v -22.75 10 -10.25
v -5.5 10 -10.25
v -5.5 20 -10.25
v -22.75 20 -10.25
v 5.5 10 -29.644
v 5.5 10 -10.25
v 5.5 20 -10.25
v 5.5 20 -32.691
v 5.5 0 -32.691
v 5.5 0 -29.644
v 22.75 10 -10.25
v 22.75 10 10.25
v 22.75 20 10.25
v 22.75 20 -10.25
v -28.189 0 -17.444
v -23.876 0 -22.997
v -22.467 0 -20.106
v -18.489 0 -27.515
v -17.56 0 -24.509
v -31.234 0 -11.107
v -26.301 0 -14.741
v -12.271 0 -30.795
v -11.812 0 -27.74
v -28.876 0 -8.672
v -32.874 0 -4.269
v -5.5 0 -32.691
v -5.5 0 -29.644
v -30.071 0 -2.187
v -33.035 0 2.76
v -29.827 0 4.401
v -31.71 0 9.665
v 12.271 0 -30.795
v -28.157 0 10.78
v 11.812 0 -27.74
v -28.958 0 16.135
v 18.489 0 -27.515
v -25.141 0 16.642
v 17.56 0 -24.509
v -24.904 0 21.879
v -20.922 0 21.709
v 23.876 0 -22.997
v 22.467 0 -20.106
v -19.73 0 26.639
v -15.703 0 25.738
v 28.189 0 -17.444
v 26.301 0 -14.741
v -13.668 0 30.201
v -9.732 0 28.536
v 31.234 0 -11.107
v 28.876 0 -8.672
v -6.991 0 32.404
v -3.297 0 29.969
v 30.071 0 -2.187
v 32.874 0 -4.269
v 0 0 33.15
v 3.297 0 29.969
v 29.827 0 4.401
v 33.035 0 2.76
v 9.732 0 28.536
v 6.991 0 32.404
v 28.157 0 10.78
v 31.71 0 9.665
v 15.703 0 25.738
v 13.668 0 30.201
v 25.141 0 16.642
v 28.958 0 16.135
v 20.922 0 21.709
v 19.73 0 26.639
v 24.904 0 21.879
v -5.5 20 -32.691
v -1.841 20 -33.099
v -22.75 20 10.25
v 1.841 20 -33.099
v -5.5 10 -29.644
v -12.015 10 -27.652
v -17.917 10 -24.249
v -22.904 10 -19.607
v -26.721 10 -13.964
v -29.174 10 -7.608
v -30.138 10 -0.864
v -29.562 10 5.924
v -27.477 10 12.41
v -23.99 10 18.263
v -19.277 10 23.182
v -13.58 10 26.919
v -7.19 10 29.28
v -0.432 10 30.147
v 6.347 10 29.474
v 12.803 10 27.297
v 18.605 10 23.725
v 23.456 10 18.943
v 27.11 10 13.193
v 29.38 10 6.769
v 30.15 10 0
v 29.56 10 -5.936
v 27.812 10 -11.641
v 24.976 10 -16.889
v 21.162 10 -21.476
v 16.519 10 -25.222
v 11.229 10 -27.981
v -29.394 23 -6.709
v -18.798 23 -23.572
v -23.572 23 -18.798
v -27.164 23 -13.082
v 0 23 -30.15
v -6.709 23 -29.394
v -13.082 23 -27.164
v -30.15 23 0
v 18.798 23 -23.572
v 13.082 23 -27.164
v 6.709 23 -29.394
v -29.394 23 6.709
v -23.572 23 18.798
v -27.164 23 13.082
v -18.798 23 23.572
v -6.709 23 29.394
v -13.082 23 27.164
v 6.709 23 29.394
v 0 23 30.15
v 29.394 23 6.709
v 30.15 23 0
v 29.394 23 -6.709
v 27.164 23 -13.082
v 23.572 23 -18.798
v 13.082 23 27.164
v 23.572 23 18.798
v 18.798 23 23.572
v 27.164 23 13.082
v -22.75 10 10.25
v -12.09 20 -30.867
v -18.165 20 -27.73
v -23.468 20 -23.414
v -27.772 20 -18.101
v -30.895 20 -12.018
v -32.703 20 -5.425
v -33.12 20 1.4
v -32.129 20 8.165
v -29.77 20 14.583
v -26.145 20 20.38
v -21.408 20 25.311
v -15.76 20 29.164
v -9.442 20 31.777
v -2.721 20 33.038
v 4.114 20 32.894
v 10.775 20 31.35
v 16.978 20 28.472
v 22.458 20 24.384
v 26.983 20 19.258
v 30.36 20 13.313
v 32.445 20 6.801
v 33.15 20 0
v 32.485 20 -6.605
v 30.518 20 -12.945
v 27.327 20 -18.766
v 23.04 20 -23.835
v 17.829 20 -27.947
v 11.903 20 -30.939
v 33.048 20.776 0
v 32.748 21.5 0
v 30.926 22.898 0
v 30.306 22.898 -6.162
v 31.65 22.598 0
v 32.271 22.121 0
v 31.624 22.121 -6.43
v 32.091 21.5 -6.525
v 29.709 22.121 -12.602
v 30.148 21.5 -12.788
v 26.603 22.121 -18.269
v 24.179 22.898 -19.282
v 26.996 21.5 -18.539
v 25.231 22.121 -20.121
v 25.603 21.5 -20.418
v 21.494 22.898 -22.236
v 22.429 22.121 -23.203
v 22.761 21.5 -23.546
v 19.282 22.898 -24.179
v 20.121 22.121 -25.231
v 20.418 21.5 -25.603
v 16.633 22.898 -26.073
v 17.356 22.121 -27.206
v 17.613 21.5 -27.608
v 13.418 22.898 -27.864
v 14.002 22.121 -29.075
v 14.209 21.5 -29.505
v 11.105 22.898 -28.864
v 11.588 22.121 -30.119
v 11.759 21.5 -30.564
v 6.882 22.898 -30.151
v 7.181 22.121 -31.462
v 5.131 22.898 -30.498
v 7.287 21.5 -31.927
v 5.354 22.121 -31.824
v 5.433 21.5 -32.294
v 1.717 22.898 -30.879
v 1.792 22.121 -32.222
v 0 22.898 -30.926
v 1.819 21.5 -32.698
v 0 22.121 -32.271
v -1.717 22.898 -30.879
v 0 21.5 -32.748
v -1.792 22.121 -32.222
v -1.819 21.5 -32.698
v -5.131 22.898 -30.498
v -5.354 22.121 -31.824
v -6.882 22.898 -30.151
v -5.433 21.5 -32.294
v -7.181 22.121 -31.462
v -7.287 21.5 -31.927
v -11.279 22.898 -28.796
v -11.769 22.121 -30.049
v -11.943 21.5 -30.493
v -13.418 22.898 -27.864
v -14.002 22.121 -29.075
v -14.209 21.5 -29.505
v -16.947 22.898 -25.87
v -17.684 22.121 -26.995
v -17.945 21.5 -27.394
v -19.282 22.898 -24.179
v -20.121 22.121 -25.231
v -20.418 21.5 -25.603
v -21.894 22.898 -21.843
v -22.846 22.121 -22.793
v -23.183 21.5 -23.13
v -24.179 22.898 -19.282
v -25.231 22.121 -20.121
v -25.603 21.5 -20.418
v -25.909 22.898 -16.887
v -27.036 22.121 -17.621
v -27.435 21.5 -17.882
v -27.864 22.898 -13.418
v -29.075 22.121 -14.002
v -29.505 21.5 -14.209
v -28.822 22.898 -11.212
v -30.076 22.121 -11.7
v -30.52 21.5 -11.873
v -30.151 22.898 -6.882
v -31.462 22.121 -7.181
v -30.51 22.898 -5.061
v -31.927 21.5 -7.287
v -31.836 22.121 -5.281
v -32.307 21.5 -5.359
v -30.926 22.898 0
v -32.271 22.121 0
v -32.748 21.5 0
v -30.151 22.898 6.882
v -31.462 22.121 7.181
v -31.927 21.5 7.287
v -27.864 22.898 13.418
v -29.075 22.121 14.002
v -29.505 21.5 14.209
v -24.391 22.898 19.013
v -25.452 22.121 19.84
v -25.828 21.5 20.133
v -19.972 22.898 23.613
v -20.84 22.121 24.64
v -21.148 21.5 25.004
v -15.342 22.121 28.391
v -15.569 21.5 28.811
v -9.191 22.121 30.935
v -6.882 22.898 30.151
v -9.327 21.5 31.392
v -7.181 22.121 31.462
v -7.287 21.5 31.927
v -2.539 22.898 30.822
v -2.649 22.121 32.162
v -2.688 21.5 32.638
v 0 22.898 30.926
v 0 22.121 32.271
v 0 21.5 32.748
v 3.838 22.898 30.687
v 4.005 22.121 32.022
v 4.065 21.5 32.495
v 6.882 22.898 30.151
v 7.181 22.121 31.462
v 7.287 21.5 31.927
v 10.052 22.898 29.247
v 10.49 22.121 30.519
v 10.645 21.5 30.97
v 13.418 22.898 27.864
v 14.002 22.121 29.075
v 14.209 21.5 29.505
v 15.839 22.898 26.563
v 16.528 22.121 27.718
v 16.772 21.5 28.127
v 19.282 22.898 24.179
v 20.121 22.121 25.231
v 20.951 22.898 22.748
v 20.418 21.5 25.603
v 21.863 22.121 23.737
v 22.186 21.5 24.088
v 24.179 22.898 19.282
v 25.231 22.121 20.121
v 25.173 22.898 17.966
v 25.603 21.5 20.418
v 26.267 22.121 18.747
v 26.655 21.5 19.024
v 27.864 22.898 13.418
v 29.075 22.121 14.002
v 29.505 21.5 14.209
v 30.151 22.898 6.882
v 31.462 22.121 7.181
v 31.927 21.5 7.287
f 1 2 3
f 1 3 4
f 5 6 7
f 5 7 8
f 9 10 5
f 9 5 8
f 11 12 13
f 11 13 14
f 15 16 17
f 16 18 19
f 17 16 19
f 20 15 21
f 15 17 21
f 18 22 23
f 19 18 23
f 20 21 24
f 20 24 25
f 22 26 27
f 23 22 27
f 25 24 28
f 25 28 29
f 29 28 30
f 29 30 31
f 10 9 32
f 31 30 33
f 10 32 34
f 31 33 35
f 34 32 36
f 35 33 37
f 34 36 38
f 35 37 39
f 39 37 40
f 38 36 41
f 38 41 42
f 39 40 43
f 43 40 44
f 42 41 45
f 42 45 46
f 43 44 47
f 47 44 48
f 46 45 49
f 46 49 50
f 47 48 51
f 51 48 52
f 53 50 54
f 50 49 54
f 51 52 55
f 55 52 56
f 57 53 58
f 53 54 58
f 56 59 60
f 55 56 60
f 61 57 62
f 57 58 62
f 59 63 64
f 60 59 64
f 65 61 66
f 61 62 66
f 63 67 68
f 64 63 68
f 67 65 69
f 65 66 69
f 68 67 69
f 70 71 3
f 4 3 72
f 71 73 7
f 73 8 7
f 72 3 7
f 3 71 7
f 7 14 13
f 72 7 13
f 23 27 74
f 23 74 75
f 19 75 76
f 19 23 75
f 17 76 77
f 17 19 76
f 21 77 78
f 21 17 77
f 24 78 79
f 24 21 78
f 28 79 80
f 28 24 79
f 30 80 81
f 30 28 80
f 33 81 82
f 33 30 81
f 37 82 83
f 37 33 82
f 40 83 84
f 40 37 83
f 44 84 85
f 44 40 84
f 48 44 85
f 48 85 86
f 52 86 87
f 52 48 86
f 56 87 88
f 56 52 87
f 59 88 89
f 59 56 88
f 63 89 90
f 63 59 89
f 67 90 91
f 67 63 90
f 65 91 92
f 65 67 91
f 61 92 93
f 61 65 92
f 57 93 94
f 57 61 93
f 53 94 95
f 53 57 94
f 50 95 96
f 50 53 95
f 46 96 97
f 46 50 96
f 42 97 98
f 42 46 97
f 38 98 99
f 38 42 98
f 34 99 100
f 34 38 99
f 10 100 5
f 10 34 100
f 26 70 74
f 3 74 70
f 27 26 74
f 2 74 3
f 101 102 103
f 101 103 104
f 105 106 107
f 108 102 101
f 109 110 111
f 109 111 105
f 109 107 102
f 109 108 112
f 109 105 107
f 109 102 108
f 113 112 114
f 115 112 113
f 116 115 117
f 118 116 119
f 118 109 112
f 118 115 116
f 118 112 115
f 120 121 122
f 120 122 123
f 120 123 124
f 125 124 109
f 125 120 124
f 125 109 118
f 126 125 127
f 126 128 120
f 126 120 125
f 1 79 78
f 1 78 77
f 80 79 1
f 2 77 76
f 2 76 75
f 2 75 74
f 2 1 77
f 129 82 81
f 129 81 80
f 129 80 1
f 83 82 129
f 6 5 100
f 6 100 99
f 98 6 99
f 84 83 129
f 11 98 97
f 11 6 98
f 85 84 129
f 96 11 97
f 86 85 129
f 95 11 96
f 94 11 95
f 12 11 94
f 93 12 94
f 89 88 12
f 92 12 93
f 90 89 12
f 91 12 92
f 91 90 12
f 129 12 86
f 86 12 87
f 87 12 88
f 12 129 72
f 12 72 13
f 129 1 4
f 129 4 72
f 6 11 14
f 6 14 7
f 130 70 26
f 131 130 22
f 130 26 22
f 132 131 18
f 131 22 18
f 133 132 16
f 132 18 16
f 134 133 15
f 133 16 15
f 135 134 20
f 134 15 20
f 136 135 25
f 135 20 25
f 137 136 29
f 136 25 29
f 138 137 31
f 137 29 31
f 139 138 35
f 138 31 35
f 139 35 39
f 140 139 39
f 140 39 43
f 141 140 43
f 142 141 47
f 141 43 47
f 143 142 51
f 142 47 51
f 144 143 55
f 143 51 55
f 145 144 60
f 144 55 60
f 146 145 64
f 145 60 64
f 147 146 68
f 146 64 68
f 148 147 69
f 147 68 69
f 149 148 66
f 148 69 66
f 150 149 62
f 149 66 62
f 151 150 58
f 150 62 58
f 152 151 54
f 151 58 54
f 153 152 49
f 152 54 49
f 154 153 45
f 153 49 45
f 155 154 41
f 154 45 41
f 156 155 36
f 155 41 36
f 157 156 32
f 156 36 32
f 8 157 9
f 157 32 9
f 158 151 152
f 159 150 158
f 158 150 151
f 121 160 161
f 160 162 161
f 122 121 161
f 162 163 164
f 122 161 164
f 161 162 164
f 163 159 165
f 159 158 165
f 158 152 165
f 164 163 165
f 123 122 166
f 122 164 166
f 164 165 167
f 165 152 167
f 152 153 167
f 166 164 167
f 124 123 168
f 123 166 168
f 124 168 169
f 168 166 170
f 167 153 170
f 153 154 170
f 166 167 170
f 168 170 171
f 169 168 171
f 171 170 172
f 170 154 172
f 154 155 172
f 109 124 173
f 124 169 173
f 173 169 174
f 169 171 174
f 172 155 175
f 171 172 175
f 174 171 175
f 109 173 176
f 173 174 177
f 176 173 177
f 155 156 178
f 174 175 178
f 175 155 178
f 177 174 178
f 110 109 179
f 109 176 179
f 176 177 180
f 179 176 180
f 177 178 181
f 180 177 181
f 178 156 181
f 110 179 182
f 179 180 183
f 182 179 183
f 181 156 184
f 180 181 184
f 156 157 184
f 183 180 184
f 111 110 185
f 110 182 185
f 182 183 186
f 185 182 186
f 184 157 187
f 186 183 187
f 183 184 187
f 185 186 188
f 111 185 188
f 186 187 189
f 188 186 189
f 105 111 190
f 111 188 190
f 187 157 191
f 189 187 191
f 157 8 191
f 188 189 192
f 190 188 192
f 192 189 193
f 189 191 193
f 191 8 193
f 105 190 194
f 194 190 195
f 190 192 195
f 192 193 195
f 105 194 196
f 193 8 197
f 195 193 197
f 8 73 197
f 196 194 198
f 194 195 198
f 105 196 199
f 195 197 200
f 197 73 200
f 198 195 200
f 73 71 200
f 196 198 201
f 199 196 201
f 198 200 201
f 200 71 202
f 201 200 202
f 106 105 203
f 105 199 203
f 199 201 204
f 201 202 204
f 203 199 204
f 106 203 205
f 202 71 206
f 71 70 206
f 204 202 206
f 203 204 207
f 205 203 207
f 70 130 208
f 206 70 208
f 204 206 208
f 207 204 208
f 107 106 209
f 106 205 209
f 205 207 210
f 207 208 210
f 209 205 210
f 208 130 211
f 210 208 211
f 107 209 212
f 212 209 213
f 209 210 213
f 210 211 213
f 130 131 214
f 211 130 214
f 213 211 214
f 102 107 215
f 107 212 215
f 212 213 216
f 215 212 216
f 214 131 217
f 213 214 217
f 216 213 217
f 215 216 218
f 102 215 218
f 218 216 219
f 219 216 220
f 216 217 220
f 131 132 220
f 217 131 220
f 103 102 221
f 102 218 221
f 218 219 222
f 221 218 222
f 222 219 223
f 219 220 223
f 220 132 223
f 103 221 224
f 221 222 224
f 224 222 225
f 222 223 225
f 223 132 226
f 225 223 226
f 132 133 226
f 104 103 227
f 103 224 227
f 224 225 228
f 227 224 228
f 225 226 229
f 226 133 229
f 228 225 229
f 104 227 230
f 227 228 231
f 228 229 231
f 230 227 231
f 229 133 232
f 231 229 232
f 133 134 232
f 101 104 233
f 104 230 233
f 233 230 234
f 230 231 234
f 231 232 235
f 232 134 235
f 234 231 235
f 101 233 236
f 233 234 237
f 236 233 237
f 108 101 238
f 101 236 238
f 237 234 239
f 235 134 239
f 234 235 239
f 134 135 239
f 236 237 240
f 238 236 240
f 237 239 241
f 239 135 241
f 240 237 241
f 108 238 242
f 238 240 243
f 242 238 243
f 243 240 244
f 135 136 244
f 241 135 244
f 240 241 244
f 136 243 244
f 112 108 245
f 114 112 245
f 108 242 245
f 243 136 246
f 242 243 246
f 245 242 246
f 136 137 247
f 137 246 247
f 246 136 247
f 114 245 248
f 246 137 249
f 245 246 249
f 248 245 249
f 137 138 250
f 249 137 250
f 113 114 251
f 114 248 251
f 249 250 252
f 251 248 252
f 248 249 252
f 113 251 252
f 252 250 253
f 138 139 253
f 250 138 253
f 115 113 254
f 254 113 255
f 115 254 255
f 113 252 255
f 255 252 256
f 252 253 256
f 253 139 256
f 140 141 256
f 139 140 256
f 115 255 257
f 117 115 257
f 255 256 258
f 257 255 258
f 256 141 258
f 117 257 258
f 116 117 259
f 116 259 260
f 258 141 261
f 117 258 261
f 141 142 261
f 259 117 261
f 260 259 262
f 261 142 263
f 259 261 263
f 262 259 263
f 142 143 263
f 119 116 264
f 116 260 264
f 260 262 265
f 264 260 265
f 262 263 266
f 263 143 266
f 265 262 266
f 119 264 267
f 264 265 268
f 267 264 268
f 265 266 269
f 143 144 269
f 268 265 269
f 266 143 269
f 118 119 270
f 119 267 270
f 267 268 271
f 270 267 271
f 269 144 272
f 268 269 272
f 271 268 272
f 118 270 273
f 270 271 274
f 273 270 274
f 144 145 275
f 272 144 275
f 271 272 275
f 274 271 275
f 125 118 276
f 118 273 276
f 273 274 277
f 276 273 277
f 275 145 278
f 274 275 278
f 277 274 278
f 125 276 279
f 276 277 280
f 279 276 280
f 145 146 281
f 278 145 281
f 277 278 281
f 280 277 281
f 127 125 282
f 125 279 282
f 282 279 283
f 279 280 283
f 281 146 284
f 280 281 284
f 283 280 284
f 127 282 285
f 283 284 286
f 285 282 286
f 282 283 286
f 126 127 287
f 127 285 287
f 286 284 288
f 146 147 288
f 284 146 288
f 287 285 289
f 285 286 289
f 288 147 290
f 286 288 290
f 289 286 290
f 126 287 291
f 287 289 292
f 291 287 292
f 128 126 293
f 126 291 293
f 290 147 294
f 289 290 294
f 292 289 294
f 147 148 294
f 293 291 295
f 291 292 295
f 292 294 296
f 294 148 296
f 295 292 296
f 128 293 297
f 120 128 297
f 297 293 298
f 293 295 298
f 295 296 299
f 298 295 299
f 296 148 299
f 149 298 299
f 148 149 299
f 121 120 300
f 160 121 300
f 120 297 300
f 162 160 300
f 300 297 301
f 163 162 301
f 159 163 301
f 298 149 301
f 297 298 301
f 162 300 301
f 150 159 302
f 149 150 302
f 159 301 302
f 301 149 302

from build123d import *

# Parameters (mm, degrees)
SKETCH1_R           = 33.15
BOSS_EXTRUDE1_DEPTH = 23
SHELL1_T            = -3
BOSS_EXTRUDE2_START = 10
BOSS_EXTRUDE2_DEPTH = 10
CUT_EXTRUDE1_DEPTH  = 20


with BuildPart() as part:
    # Sketch1 → Boss-Extrude1 (new body)
    with BuildSketch(Plane(origin=(0, 0, 0), x_dir=(1, 0, 0), z_dir=(0, 1, 0))):
        with Locations(Location((0, 0, 0), (0, 0, 270))):
            Circle(SKETCH1_R)
    extrude(amount=BOSS_EXTRUDE1_DEPTH)

    # Shell1
    shell1_openings = [part.faces().sort_by_distance(p)[0] for p in [
        (0, 0, 0),
    ]]
    offset(amount=SHELL1_T, openings=shell1_openings, kind=Kind.INTERSECTION)

    # Sketch2 → Boss-Extrude2 (add)
    with BuildSketch(Plane.XZ.offset(-20).offset(BOSS_EXTRUDE2_START)):
        with BuildLine():
            Line((-5.5, -29.64409722), (-5.5, -10.25))
            Line((-5.5, -10.25), (-22.75, -10.25))
            Line((-22.75, -10.25), (-22.75, 10.25))
            Line((-22.75, 10.25), (22.75, 10.25))
            Line((22.75, 10.25), (22.75, -10.25))
            Line((22.75, -10.25), (5.5, -10.25))
            Line((5.5, -10.25), (5.5, -29.64409722))
            ThreePointArc((5.5, -29.64409722), (23.182401731, -19.276896794), (30.15, 0))
            ThreePointArc((30.15, 0), (-19.276896794, 23.182401731), (-5.5, -29.64409722))
        make_face()
    extrude(amount=-BOSS_EXTRUDE2_DEPTH)

    # Sketch3 → Cut-Extrude1 (cut)
    with BuildSketch(Plane.XZ):
        with BuildLine():
            Line((-5.5, -29.64409722), (-5.5, -32.69055674))
            ThreePointArc((-5.5, -32.69055674), (0, -33.15), (5.5, -32.69055674))
            Line((5.5, -32.69055674), (5.5, -29.64409722))
            ThreePointArc((5.5, -29.64409722), (0, -30.15), (-5.5, -29.64409722))
        make_face()
    extrude(amount=-CUT_EXTRUDE1_DEPTH, mode=Mode.SUBTRACT)

    # Fillet1: read off the stored shape, not the designer's step
    # Fillet1 outline → Fillet1 (revolve, cut)
    with BuildSketch(Plane.XY):
        with BuildLine():
            ThreePointArc((30.15, 23), (32.271320344, 22.121320344), (33.15, 20))
            Line((33.15, 20), (33.15, 23))
            Line((33.15, 23), (30.15, 23))
        make_face()
    revolve(axis=Axis((0, 0, 0), (0, 1, 0)), mode=Mode.SUBTRACT)


solid = part.part
